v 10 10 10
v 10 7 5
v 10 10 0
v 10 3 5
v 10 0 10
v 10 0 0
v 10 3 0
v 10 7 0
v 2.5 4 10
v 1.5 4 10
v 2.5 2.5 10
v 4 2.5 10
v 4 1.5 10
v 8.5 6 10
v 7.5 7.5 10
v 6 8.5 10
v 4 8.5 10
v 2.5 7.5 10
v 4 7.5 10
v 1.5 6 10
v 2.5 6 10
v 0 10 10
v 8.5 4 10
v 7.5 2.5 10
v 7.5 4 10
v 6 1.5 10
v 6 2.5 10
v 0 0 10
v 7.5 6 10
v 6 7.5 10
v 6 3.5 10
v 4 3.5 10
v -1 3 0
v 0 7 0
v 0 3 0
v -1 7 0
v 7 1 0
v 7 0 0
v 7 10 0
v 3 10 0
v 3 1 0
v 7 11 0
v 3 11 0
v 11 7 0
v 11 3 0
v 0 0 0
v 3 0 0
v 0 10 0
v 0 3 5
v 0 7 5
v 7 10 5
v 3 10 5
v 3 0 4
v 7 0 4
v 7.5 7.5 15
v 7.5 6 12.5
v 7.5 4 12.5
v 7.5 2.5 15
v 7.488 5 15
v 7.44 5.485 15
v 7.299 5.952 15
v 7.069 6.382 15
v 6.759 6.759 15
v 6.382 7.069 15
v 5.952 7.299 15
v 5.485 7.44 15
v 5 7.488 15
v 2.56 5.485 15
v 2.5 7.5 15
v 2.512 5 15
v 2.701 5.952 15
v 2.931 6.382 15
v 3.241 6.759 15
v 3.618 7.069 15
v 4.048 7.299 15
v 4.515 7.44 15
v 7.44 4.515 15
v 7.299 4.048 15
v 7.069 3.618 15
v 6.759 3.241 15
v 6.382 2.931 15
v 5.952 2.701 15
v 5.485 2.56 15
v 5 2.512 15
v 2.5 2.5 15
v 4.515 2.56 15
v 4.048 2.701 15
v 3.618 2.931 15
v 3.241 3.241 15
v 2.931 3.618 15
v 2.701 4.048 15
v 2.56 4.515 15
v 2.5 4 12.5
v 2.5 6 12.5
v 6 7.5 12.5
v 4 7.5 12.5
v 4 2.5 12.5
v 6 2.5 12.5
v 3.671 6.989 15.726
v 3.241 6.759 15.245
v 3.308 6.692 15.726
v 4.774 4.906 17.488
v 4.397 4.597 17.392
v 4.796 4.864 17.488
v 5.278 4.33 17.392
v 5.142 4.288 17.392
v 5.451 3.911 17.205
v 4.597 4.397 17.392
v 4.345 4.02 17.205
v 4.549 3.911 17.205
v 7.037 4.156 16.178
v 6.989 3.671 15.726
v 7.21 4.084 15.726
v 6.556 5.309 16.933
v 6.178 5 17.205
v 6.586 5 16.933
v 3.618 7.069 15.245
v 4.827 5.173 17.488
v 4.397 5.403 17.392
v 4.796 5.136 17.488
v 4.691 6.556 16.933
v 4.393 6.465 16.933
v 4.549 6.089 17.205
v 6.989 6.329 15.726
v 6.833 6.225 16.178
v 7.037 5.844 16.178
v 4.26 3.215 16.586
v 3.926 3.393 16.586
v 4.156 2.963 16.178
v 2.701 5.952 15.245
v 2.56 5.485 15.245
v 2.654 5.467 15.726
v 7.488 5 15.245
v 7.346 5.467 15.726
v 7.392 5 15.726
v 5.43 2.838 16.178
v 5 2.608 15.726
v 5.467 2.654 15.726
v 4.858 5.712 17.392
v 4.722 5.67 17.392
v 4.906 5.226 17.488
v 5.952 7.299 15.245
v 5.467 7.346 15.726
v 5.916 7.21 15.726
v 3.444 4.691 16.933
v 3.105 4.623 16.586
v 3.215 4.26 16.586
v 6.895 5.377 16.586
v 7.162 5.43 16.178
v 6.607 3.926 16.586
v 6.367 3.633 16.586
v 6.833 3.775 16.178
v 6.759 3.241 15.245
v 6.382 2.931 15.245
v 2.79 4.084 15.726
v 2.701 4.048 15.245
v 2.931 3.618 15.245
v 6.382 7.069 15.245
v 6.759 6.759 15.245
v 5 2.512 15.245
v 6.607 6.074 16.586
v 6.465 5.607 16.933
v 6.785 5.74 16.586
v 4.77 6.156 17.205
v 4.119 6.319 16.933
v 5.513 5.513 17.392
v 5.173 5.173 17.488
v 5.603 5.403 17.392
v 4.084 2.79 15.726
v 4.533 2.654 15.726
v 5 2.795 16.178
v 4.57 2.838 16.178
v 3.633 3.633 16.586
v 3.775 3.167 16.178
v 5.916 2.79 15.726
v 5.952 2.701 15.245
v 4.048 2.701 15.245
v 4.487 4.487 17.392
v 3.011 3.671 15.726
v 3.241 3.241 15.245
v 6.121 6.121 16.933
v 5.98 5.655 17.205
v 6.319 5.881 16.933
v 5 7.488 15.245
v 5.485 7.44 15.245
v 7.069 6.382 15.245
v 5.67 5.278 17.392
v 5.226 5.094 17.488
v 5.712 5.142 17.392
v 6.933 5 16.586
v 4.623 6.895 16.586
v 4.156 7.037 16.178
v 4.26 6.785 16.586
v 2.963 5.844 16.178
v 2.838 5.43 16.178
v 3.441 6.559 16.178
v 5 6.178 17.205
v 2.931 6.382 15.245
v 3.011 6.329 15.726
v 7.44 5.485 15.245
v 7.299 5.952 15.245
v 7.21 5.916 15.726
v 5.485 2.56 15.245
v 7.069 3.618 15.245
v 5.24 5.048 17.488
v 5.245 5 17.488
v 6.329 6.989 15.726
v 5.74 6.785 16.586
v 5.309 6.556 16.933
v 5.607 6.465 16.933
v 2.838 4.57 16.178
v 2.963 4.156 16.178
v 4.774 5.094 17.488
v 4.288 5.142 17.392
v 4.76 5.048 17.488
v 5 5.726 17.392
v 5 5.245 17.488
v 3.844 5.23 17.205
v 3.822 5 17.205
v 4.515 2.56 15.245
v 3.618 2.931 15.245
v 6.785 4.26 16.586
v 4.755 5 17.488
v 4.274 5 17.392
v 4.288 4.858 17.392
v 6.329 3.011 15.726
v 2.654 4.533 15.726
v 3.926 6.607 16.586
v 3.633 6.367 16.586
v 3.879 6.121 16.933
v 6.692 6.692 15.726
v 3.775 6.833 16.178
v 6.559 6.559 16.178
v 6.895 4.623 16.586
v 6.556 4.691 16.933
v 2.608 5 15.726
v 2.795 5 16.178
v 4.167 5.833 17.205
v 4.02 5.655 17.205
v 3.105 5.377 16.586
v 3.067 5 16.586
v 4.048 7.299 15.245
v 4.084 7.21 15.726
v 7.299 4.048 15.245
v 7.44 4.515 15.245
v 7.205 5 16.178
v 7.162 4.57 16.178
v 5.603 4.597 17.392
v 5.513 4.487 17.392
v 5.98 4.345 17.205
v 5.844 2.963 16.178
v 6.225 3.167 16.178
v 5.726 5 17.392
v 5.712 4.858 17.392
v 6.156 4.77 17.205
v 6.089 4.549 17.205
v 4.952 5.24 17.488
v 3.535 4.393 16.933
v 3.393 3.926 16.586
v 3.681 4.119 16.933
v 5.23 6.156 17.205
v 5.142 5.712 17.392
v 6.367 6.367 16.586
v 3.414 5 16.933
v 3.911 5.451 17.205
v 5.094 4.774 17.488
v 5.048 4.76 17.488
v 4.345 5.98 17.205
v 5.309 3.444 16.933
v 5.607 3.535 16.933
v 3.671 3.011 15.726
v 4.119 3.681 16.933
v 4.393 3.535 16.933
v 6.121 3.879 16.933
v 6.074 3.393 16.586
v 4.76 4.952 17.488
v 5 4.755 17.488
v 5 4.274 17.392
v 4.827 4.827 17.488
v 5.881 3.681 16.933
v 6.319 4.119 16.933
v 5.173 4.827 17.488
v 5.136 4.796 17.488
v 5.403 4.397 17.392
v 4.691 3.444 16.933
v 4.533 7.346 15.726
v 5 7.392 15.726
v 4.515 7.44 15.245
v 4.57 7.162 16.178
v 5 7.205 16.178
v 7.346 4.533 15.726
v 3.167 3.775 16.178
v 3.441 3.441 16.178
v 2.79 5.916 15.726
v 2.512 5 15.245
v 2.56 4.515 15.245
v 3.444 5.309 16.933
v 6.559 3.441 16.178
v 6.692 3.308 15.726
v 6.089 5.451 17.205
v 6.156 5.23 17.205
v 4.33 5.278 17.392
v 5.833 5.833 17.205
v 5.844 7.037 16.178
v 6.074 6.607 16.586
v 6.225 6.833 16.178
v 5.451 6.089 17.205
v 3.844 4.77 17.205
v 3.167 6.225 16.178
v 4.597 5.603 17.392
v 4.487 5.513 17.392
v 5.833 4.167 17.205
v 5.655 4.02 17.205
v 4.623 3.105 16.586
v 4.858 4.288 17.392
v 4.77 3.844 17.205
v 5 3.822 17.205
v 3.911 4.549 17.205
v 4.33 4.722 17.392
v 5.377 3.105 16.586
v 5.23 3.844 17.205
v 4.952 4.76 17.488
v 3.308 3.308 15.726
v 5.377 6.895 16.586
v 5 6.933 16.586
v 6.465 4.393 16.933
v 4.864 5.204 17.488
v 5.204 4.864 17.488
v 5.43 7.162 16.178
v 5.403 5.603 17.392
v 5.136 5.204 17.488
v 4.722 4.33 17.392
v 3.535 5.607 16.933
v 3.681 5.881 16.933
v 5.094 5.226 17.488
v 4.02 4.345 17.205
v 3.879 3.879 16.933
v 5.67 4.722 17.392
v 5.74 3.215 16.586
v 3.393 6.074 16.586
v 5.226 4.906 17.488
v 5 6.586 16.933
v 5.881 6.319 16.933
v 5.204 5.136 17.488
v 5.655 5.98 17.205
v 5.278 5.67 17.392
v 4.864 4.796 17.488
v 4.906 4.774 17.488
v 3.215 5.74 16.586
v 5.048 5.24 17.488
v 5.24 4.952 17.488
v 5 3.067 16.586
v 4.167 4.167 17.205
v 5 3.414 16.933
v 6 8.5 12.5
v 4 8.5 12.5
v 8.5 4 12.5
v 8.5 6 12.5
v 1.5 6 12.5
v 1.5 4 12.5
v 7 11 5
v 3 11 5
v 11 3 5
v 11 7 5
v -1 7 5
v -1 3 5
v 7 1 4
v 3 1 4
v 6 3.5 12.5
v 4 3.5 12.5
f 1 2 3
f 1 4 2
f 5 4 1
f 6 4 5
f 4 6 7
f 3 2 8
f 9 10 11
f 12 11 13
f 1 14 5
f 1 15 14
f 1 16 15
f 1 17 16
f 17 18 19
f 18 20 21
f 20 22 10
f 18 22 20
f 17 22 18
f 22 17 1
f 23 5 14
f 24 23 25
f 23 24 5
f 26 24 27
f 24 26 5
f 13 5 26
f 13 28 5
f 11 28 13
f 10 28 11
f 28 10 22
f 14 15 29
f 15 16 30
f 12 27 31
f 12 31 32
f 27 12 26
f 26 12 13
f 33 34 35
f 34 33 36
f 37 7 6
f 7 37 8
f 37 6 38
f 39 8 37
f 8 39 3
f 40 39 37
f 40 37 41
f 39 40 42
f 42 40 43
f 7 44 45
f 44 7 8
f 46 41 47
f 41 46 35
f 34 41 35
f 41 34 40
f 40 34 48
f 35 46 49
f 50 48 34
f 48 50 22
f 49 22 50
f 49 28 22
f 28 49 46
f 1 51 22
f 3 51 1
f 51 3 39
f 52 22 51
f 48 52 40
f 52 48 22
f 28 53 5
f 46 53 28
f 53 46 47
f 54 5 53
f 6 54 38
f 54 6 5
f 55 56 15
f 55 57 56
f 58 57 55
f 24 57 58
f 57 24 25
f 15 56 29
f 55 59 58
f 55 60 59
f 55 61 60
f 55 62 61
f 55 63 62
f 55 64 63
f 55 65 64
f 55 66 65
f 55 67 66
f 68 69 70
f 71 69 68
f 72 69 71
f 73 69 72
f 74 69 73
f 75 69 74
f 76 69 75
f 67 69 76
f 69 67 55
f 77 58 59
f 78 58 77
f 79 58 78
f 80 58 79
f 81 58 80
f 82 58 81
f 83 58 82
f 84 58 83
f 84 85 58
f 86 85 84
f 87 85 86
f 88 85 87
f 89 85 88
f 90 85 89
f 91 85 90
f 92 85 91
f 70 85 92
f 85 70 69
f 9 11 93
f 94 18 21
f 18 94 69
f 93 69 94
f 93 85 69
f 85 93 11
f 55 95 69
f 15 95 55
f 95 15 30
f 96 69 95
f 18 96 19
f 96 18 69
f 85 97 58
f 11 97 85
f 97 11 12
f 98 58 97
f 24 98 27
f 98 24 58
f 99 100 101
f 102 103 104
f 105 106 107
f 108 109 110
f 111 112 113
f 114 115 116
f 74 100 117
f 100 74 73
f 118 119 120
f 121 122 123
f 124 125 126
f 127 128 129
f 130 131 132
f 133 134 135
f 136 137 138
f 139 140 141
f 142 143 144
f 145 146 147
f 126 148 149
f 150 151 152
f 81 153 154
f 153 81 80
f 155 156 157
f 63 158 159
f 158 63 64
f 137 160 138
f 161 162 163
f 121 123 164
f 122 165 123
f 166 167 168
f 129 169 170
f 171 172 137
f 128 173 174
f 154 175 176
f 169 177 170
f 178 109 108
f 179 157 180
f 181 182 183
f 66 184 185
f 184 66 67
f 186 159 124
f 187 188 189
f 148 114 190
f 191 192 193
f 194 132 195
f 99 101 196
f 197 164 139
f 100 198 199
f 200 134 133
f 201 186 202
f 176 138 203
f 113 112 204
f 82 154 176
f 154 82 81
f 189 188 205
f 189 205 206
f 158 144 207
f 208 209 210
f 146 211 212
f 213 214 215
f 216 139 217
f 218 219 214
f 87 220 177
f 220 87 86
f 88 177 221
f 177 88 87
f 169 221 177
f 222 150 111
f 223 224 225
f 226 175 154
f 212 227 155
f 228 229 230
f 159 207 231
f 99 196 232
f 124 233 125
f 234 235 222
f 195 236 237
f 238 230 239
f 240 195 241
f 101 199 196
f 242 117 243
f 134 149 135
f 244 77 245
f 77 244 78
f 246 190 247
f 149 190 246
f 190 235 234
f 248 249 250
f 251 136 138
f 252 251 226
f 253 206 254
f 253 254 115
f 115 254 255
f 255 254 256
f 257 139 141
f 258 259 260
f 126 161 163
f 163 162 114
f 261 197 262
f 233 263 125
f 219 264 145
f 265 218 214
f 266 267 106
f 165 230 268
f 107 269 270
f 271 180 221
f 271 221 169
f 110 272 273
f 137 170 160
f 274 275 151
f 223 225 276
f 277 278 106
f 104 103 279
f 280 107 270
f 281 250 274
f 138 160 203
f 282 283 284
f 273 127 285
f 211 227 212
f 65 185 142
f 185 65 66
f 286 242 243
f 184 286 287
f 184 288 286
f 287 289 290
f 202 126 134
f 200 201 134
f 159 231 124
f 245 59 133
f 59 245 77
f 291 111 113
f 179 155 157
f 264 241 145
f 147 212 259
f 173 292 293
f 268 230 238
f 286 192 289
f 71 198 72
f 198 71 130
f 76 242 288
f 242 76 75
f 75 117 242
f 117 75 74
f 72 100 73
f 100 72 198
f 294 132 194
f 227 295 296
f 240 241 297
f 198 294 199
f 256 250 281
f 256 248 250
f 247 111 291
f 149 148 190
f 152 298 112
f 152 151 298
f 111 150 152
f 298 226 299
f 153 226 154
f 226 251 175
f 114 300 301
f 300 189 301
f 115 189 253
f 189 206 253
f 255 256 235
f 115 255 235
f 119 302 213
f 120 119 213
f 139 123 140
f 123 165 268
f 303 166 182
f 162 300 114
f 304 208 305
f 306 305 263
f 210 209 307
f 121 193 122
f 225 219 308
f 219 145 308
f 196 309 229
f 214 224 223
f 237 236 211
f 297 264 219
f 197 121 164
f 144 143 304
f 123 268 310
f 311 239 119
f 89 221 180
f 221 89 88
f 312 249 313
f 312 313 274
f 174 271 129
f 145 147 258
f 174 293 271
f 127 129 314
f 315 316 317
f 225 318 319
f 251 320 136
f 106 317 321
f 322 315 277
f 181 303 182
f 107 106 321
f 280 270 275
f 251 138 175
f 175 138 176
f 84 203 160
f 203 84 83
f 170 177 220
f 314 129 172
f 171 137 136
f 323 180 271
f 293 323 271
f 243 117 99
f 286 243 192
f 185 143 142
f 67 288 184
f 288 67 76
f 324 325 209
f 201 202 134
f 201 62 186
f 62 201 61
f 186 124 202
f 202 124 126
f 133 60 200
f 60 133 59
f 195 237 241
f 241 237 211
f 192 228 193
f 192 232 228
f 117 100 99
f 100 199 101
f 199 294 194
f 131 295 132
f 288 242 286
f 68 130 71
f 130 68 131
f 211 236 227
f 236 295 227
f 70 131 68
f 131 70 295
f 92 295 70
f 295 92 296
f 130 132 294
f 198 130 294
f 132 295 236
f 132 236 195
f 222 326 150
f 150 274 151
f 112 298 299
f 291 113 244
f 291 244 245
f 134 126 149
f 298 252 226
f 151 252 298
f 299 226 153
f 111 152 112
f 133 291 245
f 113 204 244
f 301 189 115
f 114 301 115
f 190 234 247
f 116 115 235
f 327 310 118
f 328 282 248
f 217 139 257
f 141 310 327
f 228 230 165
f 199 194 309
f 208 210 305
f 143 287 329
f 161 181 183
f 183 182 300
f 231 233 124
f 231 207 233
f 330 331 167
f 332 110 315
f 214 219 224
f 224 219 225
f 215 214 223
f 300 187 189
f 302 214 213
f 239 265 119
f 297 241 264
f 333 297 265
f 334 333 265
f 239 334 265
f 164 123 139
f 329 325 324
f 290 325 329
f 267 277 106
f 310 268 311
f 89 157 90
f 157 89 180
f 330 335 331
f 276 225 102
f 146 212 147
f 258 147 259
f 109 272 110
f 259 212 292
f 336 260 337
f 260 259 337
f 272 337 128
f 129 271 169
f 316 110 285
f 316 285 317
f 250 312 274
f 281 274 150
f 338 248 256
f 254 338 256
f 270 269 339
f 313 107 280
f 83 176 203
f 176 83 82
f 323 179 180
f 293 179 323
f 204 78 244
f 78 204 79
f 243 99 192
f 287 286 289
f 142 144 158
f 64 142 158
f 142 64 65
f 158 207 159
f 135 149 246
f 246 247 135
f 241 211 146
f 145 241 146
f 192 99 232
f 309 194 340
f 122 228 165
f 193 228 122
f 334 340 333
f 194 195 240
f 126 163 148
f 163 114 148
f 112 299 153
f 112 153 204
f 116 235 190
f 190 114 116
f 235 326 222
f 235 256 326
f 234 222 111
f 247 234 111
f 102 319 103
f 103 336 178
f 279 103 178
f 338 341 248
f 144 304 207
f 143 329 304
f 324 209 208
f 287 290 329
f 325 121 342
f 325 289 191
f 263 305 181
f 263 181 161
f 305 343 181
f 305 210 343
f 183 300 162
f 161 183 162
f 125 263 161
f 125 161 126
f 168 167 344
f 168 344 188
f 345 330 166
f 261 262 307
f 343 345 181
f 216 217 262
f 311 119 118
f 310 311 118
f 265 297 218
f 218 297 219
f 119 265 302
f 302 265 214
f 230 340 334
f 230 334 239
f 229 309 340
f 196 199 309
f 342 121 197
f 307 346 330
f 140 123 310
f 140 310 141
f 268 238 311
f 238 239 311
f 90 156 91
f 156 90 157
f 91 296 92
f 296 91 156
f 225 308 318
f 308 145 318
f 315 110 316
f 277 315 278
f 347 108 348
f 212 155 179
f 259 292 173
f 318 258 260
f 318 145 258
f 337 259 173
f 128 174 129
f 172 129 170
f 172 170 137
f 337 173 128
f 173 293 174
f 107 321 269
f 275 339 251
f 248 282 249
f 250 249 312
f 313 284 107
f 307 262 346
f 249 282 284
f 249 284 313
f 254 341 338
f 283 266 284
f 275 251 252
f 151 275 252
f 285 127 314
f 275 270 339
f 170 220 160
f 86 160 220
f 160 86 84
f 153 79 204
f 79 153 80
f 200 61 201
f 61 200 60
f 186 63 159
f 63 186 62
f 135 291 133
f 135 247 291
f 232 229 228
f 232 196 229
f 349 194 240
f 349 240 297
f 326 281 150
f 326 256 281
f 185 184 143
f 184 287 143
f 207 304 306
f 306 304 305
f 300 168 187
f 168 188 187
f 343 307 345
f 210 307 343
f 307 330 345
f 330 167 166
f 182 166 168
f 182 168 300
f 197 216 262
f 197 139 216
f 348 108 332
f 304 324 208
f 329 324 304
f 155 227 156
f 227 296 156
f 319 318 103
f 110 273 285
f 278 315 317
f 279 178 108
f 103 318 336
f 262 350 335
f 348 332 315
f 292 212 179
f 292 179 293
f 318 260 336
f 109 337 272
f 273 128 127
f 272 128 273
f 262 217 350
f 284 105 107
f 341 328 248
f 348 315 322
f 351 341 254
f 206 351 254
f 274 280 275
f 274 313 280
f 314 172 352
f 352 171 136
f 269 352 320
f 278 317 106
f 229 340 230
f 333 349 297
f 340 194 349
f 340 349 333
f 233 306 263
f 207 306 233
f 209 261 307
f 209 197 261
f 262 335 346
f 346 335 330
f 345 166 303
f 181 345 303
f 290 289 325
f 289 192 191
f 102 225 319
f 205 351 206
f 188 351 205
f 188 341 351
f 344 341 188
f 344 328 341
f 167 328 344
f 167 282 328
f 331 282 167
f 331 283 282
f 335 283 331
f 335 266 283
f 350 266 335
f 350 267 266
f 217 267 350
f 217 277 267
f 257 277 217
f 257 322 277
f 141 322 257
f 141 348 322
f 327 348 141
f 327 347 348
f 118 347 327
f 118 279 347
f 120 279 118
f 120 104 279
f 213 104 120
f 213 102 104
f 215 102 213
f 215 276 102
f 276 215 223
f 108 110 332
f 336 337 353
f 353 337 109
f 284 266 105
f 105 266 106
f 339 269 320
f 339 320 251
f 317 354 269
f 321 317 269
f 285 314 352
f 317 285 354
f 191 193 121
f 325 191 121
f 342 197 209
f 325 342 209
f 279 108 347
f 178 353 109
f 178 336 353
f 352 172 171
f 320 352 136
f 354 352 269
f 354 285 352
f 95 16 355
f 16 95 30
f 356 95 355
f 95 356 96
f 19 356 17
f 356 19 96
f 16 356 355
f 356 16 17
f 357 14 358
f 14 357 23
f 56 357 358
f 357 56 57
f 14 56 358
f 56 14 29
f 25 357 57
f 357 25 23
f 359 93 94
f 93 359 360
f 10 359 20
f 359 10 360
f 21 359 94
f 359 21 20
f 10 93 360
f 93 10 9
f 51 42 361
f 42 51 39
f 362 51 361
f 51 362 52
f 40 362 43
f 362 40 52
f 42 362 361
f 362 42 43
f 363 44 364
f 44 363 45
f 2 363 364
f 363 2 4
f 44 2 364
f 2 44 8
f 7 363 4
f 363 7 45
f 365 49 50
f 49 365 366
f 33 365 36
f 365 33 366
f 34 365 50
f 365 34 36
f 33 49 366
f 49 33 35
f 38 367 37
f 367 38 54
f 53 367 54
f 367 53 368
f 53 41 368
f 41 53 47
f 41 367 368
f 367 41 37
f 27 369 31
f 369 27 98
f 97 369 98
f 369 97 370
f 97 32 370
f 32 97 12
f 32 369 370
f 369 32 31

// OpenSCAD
difference() {
	union() {
		translate([0,0,0]) cube([10,10,10]);
		translate([2.5,2.5,10]) cube([5,5,5]);
		translate([5,5,15]) sphere(r=2.5,$fn=32);
		translate([4,-1+2.5+5,10]) cube([2,2,2.5]);
		translate([4+2.5,-1+2.5+2.5,10]) cube([2,2,2.5]);
		translate([4-2.5,-1+2.5+2.5,10]) cube([2,2,2.5]);
		translate([3,-1+10,0]) cube([4,2,5]);
		translate([3+6,-1+4,0]) cube([2,4,5]);
		translate([3-4,-1+4,0]) cube([2,4,5]);
	}
	translate([3,-1,-1]) cube([4,2,5]);
	translate([4,-1+2.5,10]) cube([2,2,2.5]);
}
